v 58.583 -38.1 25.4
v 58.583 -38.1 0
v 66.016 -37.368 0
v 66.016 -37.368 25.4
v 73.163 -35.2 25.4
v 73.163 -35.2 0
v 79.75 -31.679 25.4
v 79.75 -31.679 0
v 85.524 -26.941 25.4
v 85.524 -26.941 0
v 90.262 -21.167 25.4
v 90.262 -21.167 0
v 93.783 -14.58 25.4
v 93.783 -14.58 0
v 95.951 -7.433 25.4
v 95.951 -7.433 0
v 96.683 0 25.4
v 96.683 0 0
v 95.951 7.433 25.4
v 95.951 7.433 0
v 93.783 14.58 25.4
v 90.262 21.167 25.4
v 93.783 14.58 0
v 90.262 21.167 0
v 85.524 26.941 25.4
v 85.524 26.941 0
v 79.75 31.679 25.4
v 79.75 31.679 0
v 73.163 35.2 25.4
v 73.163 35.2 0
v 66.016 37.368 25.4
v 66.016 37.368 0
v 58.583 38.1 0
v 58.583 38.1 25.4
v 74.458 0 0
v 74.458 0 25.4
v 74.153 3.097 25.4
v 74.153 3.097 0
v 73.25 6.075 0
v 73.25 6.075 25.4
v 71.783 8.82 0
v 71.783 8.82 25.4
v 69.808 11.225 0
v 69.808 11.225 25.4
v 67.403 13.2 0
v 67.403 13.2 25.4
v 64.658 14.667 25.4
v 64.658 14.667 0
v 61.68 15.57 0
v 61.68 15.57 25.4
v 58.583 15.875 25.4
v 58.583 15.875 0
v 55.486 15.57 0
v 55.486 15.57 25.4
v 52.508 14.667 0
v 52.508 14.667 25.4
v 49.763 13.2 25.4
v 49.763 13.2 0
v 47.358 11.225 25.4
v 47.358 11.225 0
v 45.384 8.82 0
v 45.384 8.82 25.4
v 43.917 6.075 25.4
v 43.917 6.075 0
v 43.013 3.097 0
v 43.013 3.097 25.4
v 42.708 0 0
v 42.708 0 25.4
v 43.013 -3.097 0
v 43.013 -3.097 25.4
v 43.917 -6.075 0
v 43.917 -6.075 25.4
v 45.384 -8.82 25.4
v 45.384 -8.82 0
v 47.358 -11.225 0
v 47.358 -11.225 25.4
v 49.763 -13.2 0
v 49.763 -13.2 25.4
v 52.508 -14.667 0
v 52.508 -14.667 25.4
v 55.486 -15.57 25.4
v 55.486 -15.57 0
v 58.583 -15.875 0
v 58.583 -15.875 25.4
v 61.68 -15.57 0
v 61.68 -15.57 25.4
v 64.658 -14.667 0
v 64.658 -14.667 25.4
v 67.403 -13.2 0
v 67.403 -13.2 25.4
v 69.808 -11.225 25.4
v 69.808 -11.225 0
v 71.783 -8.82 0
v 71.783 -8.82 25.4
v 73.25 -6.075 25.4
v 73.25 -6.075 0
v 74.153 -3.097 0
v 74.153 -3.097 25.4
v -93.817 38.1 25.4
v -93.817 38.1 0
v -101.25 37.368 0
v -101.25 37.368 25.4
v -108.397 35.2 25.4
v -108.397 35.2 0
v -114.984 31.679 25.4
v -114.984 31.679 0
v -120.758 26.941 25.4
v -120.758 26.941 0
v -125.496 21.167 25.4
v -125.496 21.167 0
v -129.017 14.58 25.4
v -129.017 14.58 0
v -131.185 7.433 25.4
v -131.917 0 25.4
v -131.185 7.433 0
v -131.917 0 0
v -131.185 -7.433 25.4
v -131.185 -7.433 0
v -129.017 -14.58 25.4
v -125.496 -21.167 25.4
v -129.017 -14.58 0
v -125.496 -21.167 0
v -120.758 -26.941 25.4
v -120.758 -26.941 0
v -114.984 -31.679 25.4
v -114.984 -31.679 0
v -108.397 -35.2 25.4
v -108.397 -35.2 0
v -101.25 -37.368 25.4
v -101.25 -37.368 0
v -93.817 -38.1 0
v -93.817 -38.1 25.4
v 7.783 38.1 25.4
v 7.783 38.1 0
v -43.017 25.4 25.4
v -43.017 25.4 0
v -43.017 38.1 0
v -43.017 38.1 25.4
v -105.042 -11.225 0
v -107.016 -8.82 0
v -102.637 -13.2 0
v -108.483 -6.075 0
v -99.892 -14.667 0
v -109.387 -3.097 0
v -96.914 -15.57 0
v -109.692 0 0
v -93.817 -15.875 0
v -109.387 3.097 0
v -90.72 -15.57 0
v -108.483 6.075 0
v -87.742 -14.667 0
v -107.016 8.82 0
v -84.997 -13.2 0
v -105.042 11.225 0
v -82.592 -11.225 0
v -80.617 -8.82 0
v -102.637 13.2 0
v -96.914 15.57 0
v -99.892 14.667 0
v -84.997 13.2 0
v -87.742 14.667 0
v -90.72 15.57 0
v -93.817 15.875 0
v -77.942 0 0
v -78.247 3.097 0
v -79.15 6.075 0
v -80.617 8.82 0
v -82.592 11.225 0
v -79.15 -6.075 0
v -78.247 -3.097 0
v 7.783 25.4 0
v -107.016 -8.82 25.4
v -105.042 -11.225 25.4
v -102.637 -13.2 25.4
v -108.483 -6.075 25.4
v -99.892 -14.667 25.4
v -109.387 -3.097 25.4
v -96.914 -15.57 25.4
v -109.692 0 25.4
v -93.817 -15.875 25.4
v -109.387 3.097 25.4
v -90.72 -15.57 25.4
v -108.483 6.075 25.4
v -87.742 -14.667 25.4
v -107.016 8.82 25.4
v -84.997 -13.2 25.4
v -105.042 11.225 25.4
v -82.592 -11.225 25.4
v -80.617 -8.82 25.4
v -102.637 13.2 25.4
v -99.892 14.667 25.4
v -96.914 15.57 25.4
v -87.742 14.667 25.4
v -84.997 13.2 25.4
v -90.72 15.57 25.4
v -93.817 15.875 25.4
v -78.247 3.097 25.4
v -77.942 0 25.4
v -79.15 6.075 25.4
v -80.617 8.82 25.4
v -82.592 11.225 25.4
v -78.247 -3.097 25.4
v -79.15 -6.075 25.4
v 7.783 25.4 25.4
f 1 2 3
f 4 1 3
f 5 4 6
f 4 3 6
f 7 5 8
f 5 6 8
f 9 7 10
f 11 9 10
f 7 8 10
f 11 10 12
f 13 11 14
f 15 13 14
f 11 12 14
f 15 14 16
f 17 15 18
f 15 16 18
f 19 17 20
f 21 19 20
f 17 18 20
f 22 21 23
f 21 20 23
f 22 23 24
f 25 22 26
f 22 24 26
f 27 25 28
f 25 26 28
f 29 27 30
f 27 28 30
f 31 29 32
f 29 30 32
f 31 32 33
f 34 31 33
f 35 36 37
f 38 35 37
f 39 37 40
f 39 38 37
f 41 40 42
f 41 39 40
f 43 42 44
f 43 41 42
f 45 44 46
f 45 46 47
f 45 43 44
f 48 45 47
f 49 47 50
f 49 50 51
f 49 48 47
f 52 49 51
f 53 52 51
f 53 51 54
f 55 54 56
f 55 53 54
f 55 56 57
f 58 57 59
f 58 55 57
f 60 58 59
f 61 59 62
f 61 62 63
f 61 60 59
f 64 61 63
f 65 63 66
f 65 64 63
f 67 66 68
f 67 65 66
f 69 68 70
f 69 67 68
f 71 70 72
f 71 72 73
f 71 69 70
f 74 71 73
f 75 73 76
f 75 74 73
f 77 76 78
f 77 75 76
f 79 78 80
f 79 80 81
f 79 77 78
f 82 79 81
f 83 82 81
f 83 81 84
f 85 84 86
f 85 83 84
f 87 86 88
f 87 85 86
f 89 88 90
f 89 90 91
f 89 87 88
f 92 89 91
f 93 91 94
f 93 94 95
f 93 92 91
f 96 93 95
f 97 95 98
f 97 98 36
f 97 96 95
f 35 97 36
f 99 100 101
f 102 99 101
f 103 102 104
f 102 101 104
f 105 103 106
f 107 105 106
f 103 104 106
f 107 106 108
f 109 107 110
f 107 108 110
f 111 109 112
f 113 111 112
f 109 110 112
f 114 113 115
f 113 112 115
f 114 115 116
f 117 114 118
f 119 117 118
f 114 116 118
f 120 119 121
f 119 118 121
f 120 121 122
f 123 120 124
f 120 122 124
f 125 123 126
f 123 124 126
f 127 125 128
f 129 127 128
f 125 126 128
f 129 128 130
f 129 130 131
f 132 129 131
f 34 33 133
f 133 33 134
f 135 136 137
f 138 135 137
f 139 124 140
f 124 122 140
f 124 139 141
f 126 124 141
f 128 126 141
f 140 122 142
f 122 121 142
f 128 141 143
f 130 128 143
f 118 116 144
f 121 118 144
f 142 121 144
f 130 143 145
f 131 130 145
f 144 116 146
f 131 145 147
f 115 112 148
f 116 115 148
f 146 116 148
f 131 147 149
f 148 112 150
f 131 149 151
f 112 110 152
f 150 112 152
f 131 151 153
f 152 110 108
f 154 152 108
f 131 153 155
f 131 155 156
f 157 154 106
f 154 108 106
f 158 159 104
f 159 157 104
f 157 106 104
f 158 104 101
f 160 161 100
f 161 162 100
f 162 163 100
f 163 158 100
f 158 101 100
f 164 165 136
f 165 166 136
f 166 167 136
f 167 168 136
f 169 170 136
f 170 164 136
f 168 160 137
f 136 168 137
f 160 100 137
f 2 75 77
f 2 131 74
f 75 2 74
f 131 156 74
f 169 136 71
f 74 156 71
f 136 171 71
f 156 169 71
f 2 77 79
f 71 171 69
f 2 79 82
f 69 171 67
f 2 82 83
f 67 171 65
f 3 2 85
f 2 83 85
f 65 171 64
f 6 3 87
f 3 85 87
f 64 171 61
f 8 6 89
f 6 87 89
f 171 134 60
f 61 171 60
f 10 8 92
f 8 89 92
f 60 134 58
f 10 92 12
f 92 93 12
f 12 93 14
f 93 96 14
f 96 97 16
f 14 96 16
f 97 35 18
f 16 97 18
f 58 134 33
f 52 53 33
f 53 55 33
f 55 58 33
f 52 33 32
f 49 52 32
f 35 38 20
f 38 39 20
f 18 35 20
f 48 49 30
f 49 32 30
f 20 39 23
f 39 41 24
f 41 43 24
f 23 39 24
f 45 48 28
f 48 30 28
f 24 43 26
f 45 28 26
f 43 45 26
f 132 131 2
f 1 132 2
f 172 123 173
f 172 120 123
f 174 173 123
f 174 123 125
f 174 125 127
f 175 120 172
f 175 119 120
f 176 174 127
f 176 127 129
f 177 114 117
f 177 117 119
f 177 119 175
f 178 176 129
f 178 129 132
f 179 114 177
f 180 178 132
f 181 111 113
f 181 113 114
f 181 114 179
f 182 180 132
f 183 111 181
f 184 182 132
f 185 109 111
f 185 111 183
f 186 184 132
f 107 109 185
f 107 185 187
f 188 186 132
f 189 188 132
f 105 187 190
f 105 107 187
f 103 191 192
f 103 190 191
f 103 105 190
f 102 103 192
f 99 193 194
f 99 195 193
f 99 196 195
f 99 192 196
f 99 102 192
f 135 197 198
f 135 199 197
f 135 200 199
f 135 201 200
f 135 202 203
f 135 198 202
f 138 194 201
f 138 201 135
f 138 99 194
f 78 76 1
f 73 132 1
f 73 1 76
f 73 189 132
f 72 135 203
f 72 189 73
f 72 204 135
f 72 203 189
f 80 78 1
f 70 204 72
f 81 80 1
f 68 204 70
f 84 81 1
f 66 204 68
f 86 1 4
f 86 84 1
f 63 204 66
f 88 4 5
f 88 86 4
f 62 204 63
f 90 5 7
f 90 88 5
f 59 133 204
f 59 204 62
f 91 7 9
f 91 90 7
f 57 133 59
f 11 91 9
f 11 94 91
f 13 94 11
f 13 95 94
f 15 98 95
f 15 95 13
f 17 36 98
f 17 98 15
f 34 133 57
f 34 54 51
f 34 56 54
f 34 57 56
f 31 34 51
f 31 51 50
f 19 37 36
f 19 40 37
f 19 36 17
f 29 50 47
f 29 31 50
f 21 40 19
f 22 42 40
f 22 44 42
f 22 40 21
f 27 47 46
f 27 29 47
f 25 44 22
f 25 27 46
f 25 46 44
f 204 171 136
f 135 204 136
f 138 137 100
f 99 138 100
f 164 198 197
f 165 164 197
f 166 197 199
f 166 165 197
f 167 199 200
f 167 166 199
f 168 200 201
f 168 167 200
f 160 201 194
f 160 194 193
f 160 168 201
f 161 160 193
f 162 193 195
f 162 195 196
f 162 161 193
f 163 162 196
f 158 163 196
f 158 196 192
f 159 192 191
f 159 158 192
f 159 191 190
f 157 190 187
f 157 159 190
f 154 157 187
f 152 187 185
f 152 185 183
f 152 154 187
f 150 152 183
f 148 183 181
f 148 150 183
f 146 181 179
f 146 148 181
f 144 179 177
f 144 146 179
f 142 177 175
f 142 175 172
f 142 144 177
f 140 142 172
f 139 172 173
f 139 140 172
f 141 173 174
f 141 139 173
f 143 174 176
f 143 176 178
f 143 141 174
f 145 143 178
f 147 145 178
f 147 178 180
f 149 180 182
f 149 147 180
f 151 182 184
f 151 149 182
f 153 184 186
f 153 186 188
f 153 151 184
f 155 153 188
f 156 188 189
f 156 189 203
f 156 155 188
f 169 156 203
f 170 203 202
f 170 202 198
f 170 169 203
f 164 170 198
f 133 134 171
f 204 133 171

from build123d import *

# Parameters (mm, degrees)
F0_R     = 15.875
F1_DEPTH = 25.4


with BuildPart() as f1:
    # F0 (on Top) → F1 (new body)
    with BuildSketch(Plane.XY):
        with BuildLine():
            Line((-93.816891, -38.1), (58.583109, -38.1))
            ThreePointArc((58.583109, -38.1), (96.683109, 0), (58.583109, 38.1))
            Line((58.583109, 38.1), (7.783109, 38.1))
            Line((7.783109, 38.1), (7.783109, 25.4))
            Line((7.783109, 25.4), (-43.016891, 25.4))
            Line((-43.016891, 25.4), (-43.016891, 38.1))
            Line((-43.016891, 38.1), (-93.816891, 38.1))
            ThreePointArc((-93.816891, 38.1), (-131.916891, 0), (-93.816891, -38.1))
        make_face()
        with Locations((-93.816891, 0)):
            Circle(F0_R, mode=Mode.SUBTRACT)
        with Locations((58.583109, 0)):
            Circle(F0_R, mode=Mode.SUBTRACT)
    extrude(amount=F1_DEPTH)


solid = f1.part
